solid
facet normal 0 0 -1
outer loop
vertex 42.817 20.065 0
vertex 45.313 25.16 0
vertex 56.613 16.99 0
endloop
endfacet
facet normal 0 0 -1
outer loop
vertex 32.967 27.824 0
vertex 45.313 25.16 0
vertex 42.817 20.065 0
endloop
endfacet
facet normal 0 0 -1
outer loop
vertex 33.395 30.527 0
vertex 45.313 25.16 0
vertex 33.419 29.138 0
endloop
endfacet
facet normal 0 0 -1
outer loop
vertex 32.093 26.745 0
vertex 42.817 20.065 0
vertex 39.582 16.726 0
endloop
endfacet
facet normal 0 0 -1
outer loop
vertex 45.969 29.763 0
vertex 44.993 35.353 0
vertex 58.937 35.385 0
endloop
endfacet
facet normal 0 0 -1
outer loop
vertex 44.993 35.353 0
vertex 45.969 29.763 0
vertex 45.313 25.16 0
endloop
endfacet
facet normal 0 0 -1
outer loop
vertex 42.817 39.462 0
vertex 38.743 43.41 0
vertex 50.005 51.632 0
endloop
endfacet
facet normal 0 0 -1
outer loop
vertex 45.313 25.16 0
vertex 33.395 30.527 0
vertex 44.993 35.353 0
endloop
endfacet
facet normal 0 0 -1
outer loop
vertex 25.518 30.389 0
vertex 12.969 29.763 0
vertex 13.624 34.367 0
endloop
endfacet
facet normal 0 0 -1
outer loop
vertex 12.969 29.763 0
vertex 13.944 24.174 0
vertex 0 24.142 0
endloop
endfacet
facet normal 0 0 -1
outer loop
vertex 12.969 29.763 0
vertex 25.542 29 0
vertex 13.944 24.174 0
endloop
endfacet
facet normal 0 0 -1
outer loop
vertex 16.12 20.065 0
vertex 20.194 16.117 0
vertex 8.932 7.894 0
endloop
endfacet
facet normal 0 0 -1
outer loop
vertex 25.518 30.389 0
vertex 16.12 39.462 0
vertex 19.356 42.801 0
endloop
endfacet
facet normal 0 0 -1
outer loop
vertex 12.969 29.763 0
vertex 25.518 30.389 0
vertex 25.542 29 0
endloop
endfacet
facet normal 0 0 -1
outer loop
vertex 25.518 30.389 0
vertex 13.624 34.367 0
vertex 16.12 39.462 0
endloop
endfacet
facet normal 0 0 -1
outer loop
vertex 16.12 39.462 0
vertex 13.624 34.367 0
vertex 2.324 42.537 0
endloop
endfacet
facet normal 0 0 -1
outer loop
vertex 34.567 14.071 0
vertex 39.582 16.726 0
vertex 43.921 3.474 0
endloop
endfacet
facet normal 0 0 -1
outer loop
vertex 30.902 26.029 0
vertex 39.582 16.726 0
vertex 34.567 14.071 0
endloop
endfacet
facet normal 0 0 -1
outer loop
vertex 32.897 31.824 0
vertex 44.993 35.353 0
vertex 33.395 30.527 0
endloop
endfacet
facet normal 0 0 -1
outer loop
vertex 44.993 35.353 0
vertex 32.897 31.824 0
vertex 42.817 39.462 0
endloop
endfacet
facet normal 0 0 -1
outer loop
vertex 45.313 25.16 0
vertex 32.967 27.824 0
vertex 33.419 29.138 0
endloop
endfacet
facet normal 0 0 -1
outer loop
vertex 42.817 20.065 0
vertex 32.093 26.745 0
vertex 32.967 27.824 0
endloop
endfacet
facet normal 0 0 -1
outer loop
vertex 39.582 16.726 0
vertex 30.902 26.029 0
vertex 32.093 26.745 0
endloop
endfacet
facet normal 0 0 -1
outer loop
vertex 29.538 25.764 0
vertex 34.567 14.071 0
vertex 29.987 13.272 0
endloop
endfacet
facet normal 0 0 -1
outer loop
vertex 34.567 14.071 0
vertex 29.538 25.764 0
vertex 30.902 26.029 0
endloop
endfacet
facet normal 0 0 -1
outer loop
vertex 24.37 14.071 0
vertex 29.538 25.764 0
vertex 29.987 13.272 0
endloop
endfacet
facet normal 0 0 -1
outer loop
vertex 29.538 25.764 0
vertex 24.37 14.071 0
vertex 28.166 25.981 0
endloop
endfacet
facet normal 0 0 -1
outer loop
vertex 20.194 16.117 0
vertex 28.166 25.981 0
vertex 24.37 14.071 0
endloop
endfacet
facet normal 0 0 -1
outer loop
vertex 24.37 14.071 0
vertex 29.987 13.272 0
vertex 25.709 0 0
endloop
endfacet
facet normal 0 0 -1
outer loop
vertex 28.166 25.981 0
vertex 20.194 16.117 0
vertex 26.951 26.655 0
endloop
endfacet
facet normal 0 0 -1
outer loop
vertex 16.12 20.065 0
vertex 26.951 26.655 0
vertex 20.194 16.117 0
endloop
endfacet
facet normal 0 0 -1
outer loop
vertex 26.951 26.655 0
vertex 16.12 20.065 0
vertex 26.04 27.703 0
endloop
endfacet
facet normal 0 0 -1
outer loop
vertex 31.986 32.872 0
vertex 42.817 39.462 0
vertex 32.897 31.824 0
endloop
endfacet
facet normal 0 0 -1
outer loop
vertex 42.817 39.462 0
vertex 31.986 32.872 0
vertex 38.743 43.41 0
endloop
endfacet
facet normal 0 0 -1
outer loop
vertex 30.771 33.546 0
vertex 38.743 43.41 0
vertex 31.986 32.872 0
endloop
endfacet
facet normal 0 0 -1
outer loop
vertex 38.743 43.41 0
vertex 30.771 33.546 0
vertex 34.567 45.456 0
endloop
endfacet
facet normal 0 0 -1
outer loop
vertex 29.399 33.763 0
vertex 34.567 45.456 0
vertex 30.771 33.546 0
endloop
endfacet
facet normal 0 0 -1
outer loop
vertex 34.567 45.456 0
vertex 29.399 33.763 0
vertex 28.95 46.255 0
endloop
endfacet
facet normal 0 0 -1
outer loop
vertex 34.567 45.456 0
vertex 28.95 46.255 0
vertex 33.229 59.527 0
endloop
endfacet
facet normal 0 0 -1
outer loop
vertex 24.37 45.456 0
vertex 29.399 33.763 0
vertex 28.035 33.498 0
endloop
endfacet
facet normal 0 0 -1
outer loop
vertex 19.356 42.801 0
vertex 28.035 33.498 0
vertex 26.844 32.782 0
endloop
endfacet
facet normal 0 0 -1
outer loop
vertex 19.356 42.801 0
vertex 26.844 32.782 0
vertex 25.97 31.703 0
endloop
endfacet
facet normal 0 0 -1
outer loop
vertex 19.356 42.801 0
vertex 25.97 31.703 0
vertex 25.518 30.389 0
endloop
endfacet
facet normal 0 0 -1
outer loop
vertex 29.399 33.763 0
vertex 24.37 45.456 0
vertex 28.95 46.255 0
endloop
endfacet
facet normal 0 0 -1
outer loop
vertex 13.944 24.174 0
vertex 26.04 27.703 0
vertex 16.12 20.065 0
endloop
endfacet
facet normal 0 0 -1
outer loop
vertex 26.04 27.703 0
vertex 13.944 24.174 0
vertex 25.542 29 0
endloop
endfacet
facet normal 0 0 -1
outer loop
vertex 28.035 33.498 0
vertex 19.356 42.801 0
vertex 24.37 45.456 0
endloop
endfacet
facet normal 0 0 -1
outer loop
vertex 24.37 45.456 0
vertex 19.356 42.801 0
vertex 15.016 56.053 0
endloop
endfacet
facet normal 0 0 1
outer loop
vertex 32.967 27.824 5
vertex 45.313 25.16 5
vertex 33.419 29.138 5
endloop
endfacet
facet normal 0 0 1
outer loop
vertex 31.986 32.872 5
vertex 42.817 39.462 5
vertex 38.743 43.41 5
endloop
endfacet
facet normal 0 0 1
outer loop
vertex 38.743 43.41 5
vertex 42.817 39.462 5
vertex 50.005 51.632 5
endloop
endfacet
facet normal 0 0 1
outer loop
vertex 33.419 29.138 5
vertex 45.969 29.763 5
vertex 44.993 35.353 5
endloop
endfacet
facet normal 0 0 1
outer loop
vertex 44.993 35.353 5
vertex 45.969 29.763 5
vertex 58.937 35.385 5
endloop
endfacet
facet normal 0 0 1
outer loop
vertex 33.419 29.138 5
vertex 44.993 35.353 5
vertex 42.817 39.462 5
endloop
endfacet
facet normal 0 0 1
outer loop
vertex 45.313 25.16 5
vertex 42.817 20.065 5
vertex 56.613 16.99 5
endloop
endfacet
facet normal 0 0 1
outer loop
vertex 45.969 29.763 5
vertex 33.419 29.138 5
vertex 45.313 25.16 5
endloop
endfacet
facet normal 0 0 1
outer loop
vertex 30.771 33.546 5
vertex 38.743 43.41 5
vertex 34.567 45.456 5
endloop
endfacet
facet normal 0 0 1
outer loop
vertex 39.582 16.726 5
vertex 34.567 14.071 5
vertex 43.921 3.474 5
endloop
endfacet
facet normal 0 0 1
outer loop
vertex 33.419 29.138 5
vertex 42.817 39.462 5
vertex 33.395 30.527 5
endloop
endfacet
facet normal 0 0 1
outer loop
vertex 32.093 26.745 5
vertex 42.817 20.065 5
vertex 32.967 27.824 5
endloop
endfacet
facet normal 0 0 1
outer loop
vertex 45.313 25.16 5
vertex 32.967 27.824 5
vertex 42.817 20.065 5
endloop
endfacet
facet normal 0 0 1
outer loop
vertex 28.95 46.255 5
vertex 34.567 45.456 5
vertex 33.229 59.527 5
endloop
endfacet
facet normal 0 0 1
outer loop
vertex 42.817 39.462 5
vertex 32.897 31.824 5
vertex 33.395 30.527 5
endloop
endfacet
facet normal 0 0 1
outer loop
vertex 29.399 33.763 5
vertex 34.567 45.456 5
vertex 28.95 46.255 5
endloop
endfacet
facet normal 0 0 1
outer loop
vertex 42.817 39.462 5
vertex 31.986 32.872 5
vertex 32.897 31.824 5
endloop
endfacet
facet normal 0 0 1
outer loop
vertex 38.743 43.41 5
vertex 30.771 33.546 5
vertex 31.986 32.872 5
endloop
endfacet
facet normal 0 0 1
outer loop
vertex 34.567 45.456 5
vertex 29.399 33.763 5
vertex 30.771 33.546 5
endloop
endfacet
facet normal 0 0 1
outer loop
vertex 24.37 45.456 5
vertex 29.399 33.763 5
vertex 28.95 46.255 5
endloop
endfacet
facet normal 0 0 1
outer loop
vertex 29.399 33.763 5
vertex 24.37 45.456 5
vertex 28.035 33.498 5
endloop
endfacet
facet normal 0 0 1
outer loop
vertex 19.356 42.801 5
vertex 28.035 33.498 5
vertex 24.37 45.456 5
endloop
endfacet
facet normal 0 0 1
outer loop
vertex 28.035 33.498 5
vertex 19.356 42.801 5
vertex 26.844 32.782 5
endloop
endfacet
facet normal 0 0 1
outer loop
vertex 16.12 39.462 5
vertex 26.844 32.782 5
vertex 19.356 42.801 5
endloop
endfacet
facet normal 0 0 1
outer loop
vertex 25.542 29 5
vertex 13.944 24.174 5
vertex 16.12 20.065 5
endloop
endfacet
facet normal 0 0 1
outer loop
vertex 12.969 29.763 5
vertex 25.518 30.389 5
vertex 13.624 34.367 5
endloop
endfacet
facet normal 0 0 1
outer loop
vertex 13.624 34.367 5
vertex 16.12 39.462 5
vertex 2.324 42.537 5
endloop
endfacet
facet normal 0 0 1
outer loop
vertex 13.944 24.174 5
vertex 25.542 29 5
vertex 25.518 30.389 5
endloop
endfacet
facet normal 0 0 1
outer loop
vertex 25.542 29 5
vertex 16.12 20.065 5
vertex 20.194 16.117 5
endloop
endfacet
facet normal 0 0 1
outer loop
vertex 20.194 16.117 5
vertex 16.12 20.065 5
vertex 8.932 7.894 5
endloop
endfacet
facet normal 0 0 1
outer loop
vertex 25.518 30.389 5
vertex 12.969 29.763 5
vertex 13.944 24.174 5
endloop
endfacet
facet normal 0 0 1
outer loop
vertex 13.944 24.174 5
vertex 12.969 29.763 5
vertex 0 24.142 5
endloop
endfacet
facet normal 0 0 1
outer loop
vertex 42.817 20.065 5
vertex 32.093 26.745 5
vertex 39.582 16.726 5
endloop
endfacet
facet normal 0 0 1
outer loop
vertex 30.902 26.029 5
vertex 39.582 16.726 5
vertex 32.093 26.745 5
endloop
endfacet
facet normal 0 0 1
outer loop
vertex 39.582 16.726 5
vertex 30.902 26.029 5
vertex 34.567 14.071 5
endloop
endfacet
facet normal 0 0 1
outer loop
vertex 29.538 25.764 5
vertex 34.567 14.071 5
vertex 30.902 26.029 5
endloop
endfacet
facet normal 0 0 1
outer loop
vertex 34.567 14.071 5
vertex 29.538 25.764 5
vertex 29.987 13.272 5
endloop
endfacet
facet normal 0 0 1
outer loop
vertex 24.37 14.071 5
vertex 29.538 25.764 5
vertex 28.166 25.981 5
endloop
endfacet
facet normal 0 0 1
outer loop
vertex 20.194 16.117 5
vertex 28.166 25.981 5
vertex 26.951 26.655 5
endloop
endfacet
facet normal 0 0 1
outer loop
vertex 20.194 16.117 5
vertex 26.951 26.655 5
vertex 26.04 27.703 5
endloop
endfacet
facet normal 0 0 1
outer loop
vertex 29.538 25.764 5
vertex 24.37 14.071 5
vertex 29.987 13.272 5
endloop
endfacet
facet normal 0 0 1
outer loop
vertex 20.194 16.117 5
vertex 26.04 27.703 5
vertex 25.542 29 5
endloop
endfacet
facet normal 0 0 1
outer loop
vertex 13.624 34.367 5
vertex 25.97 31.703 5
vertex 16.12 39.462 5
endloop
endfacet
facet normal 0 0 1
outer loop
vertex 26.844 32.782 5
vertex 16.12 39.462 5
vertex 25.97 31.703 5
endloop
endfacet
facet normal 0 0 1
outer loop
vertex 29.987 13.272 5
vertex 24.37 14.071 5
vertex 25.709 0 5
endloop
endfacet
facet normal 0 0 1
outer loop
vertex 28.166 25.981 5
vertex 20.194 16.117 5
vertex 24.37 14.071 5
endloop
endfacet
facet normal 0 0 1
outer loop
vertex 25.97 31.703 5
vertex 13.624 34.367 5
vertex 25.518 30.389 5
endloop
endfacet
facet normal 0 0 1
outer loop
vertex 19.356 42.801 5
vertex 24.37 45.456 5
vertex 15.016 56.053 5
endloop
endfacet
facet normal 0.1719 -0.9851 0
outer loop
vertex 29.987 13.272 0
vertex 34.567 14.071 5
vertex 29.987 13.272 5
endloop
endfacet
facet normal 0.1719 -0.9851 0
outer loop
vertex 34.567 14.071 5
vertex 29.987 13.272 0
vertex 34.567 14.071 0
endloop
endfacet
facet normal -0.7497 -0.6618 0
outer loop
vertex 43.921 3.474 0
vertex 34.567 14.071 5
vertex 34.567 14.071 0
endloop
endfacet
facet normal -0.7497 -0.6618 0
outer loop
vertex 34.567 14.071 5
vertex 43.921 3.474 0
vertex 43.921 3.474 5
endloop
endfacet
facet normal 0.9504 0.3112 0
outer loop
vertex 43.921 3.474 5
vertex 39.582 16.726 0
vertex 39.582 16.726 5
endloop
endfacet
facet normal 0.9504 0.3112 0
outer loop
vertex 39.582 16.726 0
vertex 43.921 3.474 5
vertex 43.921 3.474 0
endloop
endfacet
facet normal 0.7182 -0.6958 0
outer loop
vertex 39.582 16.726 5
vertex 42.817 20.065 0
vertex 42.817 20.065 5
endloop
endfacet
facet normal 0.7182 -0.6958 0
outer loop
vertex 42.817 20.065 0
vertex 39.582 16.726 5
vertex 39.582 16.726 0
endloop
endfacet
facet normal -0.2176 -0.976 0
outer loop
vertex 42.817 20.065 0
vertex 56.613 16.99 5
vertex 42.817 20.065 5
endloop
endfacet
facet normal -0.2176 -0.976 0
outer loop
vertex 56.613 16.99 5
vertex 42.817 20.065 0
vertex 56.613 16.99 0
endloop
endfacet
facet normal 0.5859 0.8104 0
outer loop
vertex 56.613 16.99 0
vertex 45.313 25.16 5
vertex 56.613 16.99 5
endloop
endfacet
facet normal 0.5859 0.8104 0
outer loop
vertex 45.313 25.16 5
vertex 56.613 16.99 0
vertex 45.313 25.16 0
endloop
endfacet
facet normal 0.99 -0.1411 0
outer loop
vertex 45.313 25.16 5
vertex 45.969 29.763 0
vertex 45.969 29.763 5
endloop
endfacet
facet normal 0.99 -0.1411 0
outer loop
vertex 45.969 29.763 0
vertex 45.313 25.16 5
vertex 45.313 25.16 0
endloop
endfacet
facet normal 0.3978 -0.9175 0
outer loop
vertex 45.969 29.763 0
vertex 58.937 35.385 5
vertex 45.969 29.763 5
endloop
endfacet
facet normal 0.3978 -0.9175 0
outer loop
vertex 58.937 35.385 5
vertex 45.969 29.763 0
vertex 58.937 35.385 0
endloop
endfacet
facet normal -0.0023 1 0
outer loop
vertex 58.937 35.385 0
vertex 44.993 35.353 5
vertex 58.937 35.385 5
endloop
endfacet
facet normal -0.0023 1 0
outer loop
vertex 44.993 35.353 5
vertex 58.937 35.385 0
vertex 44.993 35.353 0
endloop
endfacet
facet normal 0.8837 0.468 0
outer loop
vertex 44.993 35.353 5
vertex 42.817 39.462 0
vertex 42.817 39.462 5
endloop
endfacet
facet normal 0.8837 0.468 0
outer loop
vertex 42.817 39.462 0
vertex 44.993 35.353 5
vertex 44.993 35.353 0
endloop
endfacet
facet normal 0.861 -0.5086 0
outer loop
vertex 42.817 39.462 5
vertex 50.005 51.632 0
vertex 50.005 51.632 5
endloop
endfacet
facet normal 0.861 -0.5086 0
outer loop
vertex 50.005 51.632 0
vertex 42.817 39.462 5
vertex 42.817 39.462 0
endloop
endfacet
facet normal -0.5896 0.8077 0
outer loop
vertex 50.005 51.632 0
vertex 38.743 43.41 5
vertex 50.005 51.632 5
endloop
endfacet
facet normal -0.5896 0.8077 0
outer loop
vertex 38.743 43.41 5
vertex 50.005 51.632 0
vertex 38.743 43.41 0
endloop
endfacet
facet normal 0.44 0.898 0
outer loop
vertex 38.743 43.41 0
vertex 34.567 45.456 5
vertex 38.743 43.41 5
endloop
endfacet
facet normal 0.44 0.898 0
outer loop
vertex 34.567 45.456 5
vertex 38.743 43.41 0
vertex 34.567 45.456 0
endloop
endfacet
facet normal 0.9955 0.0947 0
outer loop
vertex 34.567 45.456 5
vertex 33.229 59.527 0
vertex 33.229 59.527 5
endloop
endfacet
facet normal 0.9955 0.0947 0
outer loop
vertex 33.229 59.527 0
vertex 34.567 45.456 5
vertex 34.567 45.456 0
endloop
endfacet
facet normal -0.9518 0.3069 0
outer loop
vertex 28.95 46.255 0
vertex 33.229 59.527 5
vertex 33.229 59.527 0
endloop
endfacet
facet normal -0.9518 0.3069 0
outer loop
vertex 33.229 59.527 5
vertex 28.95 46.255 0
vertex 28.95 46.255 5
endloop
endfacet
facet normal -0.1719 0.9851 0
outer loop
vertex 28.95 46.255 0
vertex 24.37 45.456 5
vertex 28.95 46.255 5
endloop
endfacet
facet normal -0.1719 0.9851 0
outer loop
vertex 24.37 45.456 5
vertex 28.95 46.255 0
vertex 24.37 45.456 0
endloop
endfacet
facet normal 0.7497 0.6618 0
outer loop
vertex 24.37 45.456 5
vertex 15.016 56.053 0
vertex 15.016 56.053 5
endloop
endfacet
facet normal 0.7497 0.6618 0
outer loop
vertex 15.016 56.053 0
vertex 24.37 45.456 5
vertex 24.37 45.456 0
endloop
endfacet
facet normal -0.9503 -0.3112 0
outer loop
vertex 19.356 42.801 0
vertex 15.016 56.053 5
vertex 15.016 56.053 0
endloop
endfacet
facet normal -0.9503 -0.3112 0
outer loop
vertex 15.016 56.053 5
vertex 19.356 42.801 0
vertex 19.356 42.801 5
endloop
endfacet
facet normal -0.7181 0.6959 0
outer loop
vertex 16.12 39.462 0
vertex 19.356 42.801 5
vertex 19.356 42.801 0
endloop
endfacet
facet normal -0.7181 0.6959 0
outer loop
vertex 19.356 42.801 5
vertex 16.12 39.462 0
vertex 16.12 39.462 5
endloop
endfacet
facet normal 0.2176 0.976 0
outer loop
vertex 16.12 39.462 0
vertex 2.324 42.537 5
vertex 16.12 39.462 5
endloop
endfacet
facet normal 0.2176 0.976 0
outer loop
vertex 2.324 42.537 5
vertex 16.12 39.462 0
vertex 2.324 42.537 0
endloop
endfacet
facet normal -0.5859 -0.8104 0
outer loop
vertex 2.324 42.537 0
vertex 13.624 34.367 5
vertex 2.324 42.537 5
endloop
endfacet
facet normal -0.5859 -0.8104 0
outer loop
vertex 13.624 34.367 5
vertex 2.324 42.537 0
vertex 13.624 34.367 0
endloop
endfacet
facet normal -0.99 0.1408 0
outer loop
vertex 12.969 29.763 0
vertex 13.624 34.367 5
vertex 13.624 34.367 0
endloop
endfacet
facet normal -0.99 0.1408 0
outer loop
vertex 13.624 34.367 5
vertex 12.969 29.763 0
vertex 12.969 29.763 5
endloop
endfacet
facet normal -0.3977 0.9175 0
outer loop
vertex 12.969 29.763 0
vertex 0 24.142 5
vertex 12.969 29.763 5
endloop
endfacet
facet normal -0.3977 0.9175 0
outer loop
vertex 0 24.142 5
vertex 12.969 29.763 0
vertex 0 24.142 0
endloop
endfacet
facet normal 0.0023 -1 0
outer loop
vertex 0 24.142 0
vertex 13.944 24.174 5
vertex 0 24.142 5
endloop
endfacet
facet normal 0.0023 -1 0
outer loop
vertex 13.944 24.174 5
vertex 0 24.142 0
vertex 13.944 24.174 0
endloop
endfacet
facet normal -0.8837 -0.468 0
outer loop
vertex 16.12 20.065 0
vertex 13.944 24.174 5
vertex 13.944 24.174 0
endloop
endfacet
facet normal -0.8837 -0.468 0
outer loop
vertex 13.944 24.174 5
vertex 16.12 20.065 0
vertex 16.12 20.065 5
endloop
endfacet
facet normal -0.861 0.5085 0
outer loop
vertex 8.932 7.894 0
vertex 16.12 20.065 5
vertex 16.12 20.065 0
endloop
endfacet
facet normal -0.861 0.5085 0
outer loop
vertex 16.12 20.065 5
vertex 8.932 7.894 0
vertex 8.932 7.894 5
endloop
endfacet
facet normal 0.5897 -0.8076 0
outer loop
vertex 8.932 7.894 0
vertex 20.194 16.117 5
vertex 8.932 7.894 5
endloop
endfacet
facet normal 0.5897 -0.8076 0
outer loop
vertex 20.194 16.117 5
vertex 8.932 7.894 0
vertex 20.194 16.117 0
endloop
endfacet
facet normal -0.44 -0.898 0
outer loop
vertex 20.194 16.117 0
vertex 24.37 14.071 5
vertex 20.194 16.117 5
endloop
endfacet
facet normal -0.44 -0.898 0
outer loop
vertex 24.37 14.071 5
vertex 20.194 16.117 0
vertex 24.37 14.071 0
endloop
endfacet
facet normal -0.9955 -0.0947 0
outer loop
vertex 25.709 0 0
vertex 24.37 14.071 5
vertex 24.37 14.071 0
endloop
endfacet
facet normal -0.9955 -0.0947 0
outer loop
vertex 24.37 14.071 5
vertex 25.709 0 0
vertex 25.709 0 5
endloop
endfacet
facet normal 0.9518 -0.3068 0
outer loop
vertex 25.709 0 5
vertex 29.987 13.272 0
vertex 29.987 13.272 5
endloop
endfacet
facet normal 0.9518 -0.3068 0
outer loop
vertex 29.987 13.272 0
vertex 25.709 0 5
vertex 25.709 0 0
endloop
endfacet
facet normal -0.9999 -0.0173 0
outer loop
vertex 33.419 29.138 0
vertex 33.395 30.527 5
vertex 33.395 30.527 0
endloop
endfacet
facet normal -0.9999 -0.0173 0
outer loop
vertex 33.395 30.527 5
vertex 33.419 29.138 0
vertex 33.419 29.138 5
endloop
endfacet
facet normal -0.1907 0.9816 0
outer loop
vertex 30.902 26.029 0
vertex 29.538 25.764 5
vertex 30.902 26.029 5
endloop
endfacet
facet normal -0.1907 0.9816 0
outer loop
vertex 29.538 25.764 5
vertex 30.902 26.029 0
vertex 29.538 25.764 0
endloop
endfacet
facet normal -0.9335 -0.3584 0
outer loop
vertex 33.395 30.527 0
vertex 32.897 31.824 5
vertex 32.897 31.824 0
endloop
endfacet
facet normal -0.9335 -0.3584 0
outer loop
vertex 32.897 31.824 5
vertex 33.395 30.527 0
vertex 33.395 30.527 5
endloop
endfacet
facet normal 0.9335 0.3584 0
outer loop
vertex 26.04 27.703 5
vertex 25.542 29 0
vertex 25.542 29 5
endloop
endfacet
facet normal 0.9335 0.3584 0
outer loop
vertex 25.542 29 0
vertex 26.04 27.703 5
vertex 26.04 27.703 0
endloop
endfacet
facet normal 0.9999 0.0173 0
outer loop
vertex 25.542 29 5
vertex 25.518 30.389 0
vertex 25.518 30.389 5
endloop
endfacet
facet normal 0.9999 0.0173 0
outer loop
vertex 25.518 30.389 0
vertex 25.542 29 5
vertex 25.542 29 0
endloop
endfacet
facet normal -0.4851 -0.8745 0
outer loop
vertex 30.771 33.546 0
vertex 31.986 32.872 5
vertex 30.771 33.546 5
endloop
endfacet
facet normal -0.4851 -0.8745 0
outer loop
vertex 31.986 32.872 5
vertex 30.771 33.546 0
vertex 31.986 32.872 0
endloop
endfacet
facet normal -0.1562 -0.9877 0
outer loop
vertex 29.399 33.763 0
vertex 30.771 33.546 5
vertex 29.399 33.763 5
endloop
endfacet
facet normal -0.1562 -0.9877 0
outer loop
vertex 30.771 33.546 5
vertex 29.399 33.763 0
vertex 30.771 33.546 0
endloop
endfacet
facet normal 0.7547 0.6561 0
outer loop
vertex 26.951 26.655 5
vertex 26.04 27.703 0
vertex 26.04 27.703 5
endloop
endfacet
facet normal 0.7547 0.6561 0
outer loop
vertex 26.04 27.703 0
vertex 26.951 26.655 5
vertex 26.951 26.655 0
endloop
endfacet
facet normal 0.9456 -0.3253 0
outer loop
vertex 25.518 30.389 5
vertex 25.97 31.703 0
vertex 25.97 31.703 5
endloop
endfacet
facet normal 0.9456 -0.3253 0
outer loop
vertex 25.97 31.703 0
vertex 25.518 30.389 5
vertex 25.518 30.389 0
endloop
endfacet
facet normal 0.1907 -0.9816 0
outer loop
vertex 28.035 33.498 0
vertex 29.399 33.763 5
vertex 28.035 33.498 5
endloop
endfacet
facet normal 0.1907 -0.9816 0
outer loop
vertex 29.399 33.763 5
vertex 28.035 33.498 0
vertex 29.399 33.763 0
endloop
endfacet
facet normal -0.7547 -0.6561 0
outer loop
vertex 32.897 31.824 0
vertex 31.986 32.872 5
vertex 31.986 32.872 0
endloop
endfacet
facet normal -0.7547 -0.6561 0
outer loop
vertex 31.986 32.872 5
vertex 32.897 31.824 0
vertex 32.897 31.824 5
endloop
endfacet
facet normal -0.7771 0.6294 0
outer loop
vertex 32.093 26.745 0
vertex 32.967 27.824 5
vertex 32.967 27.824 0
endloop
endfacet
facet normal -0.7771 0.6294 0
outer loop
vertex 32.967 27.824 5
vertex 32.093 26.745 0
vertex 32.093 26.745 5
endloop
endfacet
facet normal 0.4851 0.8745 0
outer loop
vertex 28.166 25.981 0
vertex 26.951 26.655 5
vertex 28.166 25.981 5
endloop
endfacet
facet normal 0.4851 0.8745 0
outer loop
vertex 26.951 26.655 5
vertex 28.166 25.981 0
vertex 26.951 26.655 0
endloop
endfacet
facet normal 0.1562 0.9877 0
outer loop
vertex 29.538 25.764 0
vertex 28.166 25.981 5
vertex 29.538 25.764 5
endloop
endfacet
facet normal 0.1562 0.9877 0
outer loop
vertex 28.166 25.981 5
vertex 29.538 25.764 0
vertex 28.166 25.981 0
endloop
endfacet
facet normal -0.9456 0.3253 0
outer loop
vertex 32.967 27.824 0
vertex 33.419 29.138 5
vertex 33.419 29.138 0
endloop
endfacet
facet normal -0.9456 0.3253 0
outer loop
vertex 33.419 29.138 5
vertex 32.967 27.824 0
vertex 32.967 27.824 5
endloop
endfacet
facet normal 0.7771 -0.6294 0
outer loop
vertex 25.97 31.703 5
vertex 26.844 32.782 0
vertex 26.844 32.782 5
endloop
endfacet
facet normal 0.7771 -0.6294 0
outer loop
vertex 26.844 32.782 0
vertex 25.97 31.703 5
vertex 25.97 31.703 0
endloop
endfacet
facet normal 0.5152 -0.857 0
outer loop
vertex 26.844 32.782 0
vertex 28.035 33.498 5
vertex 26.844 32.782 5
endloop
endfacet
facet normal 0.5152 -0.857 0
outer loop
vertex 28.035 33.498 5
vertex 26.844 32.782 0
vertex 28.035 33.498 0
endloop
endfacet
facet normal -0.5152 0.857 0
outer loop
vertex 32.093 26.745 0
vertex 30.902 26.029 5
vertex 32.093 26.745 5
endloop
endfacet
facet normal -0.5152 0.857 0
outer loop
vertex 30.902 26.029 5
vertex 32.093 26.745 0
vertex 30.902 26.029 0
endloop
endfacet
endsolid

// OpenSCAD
$fn = 32;

// ----------------------------------------------------------------------
// Star wheel: 10-point ratchet, R30
// ----------------------------------------------------------------------

// --- parameters (mm) ---
n_points = 10;            // number of points / teeth
r_out = 30;               // tip radius
r_in = 16.5;              // root radius
bore_r = 4;               // centre bore radius
plate_t = 5;              // plate thickness, Z (extrusion height)
bore_d = 8;               // centre bore diameter

profile = [[45.969, 29.763], [58.937, 35.385], [44.993, 35.353], [42.817, 39.462], [50.005, 51.632], [38.743, 43.41], [34.567, 45.456], [33.229, 59.527], [28.95, 46.255], [24.37, 45.456], [15.016, 56.053], [19.356, 42.801], [16.12, 39.462], [2.324, 42.537], [13.624, 34.367], [12.969, 29.763], [0, 24.142], [13.944, 24.174], [16.12, 20.065], [8.932, 7.894], [20.194, 16.117], [24.37, 14.071], [25.709, 0], [29.987, 13.272], [34.567, 14.071], [43.921, 3.474], [39.582, 16.726], [42.817, 20.065], [56.613, 16.99], [45.313, 25.16]];  // primary outline, 30 points, counter clockwise
void_1 = [[33.395, 30.527], [32.897, 31.824], [31.986, 32.872], [30.771, 33.546], [29.399, 33.763], [28.035, 33.498], [26.844, 32.782], [25.97, 31.703], [25.518, 30.389], [25.542, 29], [26.04, 27.703], [26.951, 26.655], [28.166, 25.981], [29.538, 25.764], [30.902, 26.029], [32.093, 26.745], [32.967, 27.824], [33.419, 29.138]];  // centre bore, 18 points

// --- the one profile operation ---
difference() {
  linear_extrude(height = plate_t) polygon(points = profile);
  translate([0, 0, -1])
    linear_extrude(height = plate_t + 2) polygon(points = void_1);
}
